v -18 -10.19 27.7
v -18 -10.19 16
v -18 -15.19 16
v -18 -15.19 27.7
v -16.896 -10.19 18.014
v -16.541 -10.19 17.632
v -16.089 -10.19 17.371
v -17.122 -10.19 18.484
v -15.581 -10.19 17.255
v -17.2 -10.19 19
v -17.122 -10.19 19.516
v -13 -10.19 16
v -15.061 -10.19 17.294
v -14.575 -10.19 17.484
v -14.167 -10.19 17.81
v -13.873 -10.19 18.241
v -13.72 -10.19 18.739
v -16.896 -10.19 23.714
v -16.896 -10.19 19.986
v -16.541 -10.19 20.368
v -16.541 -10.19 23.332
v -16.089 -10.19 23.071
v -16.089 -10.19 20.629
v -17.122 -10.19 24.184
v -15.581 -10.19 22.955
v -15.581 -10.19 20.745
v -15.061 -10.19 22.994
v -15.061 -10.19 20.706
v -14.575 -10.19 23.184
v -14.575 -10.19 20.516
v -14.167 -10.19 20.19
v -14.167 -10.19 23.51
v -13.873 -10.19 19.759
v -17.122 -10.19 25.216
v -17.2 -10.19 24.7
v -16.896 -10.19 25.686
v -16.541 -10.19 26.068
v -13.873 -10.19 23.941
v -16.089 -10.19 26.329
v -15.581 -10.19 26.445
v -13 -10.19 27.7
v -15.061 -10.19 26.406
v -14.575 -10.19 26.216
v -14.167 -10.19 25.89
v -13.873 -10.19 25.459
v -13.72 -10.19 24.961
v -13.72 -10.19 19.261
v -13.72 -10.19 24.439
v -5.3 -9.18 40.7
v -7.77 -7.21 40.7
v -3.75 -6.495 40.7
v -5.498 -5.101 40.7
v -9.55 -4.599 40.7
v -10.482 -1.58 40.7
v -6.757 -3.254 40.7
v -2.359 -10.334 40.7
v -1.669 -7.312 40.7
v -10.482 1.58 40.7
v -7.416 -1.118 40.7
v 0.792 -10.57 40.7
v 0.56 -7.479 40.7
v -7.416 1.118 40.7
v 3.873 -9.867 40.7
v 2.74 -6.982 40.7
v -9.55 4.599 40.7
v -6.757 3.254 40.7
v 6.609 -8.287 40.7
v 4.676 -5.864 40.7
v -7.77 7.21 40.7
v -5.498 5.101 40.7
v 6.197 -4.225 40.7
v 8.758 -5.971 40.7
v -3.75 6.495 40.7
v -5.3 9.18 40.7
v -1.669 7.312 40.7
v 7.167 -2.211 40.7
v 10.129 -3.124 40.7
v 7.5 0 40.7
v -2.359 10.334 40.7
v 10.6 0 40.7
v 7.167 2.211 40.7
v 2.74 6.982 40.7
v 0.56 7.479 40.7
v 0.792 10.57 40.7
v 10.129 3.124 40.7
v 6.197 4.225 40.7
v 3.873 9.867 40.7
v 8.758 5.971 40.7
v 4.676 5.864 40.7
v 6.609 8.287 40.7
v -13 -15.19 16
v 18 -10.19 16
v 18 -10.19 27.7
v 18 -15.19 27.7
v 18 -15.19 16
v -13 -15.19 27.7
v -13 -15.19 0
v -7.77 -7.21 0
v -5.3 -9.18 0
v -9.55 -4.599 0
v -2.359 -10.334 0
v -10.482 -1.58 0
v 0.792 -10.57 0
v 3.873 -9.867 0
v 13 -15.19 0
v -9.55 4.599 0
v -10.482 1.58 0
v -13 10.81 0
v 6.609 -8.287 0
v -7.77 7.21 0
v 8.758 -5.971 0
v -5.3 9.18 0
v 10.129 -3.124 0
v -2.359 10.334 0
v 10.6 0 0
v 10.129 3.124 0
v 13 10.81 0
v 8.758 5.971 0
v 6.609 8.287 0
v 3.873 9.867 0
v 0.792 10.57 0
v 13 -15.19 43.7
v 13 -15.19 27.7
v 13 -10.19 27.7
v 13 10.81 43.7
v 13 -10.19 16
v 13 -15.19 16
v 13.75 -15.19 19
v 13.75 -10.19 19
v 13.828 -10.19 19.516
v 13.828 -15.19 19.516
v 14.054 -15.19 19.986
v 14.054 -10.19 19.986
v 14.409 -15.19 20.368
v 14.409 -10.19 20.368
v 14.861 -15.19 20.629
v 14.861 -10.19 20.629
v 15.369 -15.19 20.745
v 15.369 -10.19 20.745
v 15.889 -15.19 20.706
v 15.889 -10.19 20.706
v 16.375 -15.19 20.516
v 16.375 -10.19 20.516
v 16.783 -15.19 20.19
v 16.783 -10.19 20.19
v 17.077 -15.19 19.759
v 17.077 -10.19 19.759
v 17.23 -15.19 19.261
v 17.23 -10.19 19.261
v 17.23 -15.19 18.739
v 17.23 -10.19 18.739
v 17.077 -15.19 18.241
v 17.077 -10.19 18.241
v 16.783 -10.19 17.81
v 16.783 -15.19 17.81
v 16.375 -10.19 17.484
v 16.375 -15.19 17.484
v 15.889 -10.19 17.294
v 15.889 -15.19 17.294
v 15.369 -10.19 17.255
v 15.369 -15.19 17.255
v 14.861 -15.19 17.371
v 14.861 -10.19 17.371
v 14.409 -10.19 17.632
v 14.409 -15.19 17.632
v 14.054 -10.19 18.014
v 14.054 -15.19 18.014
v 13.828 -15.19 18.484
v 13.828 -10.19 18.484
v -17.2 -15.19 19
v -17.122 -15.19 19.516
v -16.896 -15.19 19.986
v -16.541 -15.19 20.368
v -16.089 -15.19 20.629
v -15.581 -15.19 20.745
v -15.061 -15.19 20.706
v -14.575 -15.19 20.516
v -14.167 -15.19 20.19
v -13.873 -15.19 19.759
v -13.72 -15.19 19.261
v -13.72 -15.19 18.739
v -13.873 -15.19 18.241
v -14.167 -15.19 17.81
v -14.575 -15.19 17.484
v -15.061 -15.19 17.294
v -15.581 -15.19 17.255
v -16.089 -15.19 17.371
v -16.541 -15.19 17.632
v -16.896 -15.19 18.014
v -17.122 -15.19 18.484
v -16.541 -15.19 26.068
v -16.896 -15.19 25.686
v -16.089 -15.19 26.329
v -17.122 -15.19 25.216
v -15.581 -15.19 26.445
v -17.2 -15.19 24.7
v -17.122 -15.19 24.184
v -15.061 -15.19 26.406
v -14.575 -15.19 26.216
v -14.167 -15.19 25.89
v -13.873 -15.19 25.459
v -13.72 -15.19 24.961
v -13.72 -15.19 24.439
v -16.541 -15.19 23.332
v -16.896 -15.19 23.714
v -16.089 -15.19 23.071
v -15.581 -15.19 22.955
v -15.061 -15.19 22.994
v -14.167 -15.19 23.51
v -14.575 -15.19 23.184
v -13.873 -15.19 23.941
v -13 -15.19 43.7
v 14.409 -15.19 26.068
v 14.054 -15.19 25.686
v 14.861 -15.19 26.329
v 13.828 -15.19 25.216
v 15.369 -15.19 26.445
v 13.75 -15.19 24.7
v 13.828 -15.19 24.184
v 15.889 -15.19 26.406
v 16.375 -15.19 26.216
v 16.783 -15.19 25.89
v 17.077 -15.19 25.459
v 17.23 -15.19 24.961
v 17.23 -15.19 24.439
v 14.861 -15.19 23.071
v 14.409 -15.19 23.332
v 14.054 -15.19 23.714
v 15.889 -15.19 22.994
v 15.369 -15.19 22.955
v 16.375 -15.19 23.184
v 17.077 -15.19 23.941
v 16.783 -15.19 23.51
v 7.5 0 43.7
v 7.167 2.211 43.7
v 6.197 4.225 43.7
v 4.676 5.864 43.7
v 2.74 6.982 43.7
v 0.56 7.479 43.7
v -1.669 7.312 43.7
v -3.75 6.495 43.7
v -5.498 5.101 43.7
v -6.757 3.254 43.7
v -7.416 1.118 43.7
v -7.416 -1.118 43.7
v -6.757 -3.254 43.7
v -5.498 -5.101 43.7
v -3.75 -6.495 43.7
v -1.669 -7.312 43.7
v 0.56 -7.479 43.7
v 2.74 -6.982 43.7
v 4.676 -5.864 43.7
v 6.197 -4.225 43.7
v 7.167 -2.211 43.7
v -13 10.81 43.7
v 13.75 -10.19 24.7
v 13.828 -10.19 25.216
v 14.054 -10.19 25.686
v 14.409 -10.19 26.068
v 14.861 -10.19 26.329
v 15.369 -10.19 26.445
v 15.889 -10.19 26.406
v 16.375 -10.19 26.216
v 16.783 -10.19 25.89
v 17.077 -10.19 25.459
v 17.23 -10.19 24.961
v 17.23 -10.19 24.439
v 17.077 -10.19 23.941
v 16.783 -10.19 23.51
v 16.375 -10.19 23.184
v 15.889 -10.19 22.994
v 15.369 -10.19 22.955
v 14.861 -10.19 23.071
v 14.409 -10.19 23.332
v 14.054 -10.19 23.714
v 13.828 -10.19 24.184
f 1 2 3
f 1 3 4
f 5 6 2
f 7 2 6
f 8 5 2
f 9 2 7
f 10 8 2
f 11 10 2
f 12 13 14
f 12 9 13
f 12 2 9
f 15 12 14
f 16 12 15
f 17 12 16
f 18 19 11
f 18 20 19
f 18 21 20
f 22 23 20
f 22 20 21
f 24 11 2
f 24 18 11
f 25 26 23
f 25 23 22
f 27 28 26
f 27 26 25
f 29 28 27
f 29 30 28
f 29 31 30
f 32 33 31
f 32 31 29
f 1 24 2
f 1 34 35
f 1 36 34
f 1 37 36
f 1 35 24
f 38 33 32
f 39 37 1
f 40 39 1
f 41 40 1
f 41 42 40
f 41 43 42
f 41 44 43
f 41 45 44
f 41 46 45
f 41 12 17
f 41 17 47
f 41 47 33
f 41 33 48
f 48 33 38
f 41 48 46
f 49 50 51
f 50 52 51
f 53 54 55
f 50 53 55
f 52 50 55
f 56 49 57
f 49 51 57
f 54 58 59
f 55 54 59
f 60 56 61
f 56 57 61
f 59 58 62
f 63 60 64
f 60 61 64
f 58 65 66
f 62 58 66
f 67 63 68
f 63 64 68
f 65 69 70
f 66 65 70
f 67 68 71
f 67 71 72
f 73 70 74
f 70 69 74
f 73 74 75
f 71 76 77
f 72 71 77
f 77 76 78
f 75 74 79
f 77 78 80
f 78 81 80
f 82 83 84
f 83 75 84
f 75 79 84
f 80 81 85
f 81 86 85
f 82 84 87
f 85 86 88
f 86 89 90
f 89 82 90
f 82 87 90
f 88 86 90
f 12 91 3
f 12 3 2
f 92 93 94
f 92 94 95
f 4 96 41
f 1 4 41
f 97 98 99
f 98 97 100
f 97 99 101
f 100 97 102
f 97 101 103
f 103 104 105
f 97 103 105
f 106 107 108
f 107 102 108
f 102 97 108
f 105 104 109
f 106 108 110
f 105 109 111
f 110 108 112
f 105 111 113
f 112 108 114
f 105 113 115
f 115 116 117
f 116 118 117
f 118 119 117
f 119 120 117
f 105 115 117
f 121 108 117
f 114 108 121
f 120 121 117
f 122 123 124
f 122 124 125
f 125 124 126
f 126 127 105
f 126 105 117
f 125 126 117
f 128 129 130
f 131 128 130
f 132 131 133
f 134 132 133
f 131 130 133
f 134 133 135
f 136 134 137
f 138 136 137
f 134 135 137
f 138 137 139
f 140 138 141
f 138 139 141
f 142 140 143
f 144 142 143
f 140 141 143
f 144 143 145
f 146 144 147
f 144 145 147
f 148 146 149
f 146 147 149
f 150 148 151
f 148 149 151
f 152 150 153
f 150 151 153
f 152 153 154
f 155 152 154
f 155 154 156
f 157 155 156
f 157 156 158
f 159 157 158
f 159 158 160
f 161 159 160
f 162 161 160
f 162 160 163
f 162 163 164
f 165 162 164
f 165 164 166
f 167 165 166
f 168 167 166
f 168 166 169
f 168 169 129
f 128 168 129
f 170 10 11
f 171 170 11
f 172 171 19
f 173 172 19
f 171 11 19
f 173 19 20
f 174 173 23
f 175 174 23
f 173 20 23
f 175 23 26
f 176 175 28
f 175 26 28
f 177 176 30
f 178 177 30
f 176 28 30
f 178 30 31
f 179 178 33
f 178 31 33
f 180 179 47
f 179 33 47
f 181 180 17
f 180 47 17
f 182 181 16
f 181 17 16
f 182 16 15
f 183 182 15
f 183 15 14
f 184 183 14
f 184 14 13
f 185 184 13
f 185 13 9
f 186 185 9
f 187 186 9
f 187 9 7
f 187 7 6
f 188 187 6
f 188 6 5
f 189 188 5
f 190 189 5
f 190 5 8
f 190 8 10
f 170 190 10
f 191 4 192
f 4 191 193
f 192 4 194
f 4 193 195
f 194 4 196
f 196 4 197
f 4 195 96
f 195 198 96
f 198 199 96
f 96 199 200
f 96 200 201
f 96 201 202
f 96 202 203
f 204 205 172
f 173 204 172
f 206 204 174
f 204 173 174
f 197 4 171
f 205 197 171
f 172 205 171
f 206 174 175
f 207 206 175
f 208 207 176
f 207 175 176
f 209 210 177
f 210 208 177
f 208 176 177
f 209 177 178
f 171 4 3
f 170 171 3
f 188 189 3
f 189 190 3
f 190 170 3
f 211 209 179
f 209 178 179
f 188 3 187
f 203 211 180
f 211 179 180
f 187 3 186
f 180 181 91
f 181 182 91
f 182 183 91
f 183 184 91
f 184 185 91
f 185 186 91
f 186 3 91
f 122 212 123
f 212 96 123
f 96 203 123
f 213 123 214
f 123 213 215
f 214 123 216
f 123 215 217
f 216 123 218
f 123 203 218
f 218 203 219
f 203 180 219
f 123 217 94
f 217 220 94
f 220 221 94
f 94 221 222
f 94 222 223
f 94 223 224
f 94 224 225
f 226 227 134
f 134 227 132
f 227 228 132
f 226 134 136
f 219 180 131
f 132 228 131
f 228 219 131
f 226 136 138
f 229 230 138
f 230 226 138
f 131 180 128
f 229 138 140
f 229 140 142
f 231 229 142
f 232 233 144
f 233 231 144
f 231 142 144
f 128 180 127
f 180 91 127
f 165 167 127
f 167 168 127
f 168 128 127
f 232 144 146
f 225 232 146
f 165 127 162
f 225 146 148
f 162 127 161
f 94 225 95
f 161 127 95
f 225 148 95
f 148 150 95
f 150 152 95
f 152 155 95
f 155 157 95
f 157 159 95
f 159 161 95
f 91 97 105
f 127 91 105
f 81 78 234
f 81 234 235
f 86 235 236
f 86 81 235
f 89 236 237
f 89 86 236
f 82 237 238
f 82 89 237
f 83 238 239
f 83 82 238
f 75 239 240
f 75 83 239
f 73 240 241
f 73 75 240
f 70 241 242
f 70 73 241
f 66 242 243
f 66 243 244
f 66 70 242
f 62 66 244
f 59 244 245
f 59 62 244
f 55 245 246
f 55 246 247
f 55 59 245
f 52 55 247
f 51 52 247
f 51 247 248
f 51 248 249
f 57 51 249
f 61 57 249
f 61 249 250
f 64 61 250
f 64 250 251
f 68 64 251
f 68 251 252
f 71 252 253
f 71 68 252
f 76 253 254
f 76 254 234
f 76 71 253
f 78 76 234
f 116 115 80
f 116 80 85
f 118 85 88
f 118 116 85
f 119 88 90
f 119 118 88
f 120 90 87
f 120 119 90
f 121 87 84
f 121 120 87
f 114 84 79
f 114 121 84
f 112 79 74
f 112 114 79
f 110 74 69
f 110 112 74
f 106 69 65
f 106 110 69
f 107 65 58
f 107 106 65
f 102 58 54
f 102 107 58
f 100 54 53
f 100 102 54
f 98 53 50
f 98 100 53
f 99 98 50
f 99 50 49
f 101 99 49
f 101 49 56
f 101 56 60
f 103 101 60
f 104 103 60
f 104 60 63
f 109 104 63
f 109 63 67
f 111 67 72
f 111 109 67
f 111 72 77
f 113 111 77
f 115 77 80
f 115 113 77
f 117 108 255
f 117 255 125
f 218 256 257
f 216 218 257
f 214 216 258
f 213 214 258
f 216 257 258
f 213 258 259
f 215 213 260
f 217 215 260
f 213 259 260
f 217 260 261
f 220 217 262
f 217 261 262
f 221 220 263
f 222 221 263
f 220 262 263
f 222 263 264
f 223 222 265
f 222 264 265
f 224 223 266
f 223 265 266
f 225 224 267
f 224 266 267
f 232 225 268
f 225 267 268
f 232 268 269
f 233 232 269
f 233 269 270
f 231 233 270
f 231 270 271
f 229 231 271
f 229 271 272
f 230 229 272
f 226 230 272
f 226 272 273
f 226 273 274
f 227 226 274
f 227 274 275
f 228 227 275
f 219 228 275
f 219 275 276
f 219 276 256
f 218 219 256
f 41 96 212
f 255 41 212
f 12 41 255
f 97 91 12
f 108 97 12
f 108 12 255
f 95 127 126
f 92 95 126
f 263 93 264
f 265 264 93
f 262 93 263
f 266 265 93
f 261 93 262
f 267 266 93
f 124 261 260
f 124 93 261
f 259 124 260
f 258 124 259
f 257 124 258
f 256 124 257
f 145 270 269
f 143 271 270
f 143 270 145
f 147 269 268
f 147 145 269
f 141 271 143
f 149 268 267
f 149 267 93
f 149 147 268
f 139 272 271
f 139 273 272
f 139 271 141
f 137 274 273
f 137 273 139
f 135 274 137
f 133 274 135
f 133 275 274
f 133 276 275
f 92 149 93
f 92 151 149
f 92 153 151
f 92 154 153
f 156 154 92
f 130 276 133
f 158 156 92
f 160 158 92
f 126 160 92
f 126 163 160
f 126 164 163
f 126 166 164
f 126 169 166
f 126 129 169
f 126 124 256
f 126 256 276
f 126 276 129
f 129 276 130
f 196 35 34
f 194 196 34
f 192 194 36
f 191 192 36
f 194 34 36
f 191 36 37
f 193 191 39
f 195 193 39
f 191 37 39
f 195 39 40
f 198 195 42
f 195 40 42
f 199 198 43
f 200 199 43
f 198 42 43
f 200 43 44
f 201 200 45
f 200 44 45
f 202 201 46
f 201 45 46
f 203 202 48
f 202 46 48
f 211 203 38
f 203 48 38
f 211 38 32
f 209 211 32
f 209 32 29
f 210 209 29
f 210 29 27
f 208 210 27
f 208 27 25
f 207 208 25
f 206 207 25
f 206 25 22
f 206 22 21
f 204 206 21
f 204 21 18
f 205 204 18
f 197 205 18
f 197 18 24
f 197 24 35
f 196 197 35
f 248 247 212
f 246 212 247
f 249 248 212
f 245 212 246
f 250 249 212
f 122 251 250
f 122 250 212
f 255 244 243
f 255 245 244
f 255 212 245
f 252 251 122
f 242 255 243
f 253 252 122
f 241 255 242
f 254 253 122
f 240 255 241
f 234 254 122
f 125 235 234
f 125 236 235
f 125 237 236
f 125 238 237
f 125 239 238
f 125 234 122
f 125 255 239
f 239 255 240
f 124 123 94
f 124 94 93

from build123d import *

# Parameters (mm, degrees)
ESQUISSE1_W             = 26
ESQUISSE1_H             = 26
ESQUISSE1_R             = 10.6
BOSS_EXTRU_1_DEPTH      = 40.7
ESQUISSE7_W             = 26
ESQUISSE7_H             = 26
ESQUISSE7_R             = 7.5
BOSS_EXTRU_5_DEPTH      = 3
ESQUISSE9_W             = 11.7
ESQUISSE9_H             = 5
BOSS_EXTRU_6_DEPTH      = 5
ESQUISSE11_R            = 1.75
ENL_V_MAT_EXTRU_1_DEPTH = 52.717405194
ESQUISSE17_W            = 11.7
ESQUISSE17_H            = 5
BOSS_EXTRU_7_DEPTH      = 5
ESQUISSE18_R            = 1.75
ENL_V_MAT_EXTRU_2_DEPTH = 52.717405194


with BuildPart() as part:
    # Esquisse1 → Boss.-Extru.1 (new body)
    with BuildSketch(Plane.XY):
        with Locations((0, -2.19)):
            Rectangle(ESQUISSE1_W, ESQUISSE1_H)
        Circle(ESQUISSE1_R, mode=Mode.SUBTRACT)
    extrude(amount=BOSS_EXTRU_1_DEPTH)

    # Esquisse7 → Boss.-Extru.5 (add)
    with BuildSketch(Plane.XY.offset(40.7)):
        with Locations((0, -2.19)):
            Rectangle(ESQUISSE7_W, ESQUISSE7_H)
        Circle(ESQUISSE7_R, mode=Mode.SUBTRACT)
    extrude(amount=BOSS_EXTRU_5_DEPTH)

    # Esquisse9 → Boss.-Extru.6 (add)
    with BuildSketch(Plane.ZY.offset(13)):
        with Locations((21.85, -12.69)):
            Rectangle(ESQUISSE9_W, ESQUISSE9_H)
    extrude(amount=BOSS_EXTRU_6_DEPTH)

    # Esquisse11 → Enlèv. mat.-Extru.1 (cut, through all)
    with BuildSketch(Plane(origin=(0, -10.19, 0), x_dir=(1, 0, 0), z_dir=(0, 1, 0))):
        with Locations((-15.450046311, -19)):
            Circle(ESQUISSE11_R)
        with Locations((-15.450046311, -24.7)):
            Circle(ESQUISSE11_R)
    extrude(amount=-ENL_V_MAT_EXTRU_1_DEPTH, mode=Mode.SUBTRACT)

    # Esquisse17 → Boss.-Extru.7 (add)
    with BuildSketch(Plane(origin=(13, 0, 0), x_dir=(0, 0, -1), z_dir=(1, 0, 0))):
        with Locations((-21.85, -12.69)):
            Rectangle(ESQUISSE17_W, ESQUISSE17_H)
    extrude(amount=BOSS_EXTRU_7_DEPTH)

    # Esquisse18 → Enlèv. mat.-Extru.2 (cut, through all)
    with BuildSketch(Plane(origin=(0, -10.19, 0), x_dir=(1, 0, 0), z_dir=(0, 1, 0))):
        with Locations((15.5, -24.7)):
            Circle(ESQUISSE18_R)
        with Locations((15.5, -19)):
            Circle(ESQUISSE18_R)
    extrude(amount=-ENL_V_MAT_EXTRU_2_DEPTH, mode=Mode.SUBTRACT)


solid = part.part
